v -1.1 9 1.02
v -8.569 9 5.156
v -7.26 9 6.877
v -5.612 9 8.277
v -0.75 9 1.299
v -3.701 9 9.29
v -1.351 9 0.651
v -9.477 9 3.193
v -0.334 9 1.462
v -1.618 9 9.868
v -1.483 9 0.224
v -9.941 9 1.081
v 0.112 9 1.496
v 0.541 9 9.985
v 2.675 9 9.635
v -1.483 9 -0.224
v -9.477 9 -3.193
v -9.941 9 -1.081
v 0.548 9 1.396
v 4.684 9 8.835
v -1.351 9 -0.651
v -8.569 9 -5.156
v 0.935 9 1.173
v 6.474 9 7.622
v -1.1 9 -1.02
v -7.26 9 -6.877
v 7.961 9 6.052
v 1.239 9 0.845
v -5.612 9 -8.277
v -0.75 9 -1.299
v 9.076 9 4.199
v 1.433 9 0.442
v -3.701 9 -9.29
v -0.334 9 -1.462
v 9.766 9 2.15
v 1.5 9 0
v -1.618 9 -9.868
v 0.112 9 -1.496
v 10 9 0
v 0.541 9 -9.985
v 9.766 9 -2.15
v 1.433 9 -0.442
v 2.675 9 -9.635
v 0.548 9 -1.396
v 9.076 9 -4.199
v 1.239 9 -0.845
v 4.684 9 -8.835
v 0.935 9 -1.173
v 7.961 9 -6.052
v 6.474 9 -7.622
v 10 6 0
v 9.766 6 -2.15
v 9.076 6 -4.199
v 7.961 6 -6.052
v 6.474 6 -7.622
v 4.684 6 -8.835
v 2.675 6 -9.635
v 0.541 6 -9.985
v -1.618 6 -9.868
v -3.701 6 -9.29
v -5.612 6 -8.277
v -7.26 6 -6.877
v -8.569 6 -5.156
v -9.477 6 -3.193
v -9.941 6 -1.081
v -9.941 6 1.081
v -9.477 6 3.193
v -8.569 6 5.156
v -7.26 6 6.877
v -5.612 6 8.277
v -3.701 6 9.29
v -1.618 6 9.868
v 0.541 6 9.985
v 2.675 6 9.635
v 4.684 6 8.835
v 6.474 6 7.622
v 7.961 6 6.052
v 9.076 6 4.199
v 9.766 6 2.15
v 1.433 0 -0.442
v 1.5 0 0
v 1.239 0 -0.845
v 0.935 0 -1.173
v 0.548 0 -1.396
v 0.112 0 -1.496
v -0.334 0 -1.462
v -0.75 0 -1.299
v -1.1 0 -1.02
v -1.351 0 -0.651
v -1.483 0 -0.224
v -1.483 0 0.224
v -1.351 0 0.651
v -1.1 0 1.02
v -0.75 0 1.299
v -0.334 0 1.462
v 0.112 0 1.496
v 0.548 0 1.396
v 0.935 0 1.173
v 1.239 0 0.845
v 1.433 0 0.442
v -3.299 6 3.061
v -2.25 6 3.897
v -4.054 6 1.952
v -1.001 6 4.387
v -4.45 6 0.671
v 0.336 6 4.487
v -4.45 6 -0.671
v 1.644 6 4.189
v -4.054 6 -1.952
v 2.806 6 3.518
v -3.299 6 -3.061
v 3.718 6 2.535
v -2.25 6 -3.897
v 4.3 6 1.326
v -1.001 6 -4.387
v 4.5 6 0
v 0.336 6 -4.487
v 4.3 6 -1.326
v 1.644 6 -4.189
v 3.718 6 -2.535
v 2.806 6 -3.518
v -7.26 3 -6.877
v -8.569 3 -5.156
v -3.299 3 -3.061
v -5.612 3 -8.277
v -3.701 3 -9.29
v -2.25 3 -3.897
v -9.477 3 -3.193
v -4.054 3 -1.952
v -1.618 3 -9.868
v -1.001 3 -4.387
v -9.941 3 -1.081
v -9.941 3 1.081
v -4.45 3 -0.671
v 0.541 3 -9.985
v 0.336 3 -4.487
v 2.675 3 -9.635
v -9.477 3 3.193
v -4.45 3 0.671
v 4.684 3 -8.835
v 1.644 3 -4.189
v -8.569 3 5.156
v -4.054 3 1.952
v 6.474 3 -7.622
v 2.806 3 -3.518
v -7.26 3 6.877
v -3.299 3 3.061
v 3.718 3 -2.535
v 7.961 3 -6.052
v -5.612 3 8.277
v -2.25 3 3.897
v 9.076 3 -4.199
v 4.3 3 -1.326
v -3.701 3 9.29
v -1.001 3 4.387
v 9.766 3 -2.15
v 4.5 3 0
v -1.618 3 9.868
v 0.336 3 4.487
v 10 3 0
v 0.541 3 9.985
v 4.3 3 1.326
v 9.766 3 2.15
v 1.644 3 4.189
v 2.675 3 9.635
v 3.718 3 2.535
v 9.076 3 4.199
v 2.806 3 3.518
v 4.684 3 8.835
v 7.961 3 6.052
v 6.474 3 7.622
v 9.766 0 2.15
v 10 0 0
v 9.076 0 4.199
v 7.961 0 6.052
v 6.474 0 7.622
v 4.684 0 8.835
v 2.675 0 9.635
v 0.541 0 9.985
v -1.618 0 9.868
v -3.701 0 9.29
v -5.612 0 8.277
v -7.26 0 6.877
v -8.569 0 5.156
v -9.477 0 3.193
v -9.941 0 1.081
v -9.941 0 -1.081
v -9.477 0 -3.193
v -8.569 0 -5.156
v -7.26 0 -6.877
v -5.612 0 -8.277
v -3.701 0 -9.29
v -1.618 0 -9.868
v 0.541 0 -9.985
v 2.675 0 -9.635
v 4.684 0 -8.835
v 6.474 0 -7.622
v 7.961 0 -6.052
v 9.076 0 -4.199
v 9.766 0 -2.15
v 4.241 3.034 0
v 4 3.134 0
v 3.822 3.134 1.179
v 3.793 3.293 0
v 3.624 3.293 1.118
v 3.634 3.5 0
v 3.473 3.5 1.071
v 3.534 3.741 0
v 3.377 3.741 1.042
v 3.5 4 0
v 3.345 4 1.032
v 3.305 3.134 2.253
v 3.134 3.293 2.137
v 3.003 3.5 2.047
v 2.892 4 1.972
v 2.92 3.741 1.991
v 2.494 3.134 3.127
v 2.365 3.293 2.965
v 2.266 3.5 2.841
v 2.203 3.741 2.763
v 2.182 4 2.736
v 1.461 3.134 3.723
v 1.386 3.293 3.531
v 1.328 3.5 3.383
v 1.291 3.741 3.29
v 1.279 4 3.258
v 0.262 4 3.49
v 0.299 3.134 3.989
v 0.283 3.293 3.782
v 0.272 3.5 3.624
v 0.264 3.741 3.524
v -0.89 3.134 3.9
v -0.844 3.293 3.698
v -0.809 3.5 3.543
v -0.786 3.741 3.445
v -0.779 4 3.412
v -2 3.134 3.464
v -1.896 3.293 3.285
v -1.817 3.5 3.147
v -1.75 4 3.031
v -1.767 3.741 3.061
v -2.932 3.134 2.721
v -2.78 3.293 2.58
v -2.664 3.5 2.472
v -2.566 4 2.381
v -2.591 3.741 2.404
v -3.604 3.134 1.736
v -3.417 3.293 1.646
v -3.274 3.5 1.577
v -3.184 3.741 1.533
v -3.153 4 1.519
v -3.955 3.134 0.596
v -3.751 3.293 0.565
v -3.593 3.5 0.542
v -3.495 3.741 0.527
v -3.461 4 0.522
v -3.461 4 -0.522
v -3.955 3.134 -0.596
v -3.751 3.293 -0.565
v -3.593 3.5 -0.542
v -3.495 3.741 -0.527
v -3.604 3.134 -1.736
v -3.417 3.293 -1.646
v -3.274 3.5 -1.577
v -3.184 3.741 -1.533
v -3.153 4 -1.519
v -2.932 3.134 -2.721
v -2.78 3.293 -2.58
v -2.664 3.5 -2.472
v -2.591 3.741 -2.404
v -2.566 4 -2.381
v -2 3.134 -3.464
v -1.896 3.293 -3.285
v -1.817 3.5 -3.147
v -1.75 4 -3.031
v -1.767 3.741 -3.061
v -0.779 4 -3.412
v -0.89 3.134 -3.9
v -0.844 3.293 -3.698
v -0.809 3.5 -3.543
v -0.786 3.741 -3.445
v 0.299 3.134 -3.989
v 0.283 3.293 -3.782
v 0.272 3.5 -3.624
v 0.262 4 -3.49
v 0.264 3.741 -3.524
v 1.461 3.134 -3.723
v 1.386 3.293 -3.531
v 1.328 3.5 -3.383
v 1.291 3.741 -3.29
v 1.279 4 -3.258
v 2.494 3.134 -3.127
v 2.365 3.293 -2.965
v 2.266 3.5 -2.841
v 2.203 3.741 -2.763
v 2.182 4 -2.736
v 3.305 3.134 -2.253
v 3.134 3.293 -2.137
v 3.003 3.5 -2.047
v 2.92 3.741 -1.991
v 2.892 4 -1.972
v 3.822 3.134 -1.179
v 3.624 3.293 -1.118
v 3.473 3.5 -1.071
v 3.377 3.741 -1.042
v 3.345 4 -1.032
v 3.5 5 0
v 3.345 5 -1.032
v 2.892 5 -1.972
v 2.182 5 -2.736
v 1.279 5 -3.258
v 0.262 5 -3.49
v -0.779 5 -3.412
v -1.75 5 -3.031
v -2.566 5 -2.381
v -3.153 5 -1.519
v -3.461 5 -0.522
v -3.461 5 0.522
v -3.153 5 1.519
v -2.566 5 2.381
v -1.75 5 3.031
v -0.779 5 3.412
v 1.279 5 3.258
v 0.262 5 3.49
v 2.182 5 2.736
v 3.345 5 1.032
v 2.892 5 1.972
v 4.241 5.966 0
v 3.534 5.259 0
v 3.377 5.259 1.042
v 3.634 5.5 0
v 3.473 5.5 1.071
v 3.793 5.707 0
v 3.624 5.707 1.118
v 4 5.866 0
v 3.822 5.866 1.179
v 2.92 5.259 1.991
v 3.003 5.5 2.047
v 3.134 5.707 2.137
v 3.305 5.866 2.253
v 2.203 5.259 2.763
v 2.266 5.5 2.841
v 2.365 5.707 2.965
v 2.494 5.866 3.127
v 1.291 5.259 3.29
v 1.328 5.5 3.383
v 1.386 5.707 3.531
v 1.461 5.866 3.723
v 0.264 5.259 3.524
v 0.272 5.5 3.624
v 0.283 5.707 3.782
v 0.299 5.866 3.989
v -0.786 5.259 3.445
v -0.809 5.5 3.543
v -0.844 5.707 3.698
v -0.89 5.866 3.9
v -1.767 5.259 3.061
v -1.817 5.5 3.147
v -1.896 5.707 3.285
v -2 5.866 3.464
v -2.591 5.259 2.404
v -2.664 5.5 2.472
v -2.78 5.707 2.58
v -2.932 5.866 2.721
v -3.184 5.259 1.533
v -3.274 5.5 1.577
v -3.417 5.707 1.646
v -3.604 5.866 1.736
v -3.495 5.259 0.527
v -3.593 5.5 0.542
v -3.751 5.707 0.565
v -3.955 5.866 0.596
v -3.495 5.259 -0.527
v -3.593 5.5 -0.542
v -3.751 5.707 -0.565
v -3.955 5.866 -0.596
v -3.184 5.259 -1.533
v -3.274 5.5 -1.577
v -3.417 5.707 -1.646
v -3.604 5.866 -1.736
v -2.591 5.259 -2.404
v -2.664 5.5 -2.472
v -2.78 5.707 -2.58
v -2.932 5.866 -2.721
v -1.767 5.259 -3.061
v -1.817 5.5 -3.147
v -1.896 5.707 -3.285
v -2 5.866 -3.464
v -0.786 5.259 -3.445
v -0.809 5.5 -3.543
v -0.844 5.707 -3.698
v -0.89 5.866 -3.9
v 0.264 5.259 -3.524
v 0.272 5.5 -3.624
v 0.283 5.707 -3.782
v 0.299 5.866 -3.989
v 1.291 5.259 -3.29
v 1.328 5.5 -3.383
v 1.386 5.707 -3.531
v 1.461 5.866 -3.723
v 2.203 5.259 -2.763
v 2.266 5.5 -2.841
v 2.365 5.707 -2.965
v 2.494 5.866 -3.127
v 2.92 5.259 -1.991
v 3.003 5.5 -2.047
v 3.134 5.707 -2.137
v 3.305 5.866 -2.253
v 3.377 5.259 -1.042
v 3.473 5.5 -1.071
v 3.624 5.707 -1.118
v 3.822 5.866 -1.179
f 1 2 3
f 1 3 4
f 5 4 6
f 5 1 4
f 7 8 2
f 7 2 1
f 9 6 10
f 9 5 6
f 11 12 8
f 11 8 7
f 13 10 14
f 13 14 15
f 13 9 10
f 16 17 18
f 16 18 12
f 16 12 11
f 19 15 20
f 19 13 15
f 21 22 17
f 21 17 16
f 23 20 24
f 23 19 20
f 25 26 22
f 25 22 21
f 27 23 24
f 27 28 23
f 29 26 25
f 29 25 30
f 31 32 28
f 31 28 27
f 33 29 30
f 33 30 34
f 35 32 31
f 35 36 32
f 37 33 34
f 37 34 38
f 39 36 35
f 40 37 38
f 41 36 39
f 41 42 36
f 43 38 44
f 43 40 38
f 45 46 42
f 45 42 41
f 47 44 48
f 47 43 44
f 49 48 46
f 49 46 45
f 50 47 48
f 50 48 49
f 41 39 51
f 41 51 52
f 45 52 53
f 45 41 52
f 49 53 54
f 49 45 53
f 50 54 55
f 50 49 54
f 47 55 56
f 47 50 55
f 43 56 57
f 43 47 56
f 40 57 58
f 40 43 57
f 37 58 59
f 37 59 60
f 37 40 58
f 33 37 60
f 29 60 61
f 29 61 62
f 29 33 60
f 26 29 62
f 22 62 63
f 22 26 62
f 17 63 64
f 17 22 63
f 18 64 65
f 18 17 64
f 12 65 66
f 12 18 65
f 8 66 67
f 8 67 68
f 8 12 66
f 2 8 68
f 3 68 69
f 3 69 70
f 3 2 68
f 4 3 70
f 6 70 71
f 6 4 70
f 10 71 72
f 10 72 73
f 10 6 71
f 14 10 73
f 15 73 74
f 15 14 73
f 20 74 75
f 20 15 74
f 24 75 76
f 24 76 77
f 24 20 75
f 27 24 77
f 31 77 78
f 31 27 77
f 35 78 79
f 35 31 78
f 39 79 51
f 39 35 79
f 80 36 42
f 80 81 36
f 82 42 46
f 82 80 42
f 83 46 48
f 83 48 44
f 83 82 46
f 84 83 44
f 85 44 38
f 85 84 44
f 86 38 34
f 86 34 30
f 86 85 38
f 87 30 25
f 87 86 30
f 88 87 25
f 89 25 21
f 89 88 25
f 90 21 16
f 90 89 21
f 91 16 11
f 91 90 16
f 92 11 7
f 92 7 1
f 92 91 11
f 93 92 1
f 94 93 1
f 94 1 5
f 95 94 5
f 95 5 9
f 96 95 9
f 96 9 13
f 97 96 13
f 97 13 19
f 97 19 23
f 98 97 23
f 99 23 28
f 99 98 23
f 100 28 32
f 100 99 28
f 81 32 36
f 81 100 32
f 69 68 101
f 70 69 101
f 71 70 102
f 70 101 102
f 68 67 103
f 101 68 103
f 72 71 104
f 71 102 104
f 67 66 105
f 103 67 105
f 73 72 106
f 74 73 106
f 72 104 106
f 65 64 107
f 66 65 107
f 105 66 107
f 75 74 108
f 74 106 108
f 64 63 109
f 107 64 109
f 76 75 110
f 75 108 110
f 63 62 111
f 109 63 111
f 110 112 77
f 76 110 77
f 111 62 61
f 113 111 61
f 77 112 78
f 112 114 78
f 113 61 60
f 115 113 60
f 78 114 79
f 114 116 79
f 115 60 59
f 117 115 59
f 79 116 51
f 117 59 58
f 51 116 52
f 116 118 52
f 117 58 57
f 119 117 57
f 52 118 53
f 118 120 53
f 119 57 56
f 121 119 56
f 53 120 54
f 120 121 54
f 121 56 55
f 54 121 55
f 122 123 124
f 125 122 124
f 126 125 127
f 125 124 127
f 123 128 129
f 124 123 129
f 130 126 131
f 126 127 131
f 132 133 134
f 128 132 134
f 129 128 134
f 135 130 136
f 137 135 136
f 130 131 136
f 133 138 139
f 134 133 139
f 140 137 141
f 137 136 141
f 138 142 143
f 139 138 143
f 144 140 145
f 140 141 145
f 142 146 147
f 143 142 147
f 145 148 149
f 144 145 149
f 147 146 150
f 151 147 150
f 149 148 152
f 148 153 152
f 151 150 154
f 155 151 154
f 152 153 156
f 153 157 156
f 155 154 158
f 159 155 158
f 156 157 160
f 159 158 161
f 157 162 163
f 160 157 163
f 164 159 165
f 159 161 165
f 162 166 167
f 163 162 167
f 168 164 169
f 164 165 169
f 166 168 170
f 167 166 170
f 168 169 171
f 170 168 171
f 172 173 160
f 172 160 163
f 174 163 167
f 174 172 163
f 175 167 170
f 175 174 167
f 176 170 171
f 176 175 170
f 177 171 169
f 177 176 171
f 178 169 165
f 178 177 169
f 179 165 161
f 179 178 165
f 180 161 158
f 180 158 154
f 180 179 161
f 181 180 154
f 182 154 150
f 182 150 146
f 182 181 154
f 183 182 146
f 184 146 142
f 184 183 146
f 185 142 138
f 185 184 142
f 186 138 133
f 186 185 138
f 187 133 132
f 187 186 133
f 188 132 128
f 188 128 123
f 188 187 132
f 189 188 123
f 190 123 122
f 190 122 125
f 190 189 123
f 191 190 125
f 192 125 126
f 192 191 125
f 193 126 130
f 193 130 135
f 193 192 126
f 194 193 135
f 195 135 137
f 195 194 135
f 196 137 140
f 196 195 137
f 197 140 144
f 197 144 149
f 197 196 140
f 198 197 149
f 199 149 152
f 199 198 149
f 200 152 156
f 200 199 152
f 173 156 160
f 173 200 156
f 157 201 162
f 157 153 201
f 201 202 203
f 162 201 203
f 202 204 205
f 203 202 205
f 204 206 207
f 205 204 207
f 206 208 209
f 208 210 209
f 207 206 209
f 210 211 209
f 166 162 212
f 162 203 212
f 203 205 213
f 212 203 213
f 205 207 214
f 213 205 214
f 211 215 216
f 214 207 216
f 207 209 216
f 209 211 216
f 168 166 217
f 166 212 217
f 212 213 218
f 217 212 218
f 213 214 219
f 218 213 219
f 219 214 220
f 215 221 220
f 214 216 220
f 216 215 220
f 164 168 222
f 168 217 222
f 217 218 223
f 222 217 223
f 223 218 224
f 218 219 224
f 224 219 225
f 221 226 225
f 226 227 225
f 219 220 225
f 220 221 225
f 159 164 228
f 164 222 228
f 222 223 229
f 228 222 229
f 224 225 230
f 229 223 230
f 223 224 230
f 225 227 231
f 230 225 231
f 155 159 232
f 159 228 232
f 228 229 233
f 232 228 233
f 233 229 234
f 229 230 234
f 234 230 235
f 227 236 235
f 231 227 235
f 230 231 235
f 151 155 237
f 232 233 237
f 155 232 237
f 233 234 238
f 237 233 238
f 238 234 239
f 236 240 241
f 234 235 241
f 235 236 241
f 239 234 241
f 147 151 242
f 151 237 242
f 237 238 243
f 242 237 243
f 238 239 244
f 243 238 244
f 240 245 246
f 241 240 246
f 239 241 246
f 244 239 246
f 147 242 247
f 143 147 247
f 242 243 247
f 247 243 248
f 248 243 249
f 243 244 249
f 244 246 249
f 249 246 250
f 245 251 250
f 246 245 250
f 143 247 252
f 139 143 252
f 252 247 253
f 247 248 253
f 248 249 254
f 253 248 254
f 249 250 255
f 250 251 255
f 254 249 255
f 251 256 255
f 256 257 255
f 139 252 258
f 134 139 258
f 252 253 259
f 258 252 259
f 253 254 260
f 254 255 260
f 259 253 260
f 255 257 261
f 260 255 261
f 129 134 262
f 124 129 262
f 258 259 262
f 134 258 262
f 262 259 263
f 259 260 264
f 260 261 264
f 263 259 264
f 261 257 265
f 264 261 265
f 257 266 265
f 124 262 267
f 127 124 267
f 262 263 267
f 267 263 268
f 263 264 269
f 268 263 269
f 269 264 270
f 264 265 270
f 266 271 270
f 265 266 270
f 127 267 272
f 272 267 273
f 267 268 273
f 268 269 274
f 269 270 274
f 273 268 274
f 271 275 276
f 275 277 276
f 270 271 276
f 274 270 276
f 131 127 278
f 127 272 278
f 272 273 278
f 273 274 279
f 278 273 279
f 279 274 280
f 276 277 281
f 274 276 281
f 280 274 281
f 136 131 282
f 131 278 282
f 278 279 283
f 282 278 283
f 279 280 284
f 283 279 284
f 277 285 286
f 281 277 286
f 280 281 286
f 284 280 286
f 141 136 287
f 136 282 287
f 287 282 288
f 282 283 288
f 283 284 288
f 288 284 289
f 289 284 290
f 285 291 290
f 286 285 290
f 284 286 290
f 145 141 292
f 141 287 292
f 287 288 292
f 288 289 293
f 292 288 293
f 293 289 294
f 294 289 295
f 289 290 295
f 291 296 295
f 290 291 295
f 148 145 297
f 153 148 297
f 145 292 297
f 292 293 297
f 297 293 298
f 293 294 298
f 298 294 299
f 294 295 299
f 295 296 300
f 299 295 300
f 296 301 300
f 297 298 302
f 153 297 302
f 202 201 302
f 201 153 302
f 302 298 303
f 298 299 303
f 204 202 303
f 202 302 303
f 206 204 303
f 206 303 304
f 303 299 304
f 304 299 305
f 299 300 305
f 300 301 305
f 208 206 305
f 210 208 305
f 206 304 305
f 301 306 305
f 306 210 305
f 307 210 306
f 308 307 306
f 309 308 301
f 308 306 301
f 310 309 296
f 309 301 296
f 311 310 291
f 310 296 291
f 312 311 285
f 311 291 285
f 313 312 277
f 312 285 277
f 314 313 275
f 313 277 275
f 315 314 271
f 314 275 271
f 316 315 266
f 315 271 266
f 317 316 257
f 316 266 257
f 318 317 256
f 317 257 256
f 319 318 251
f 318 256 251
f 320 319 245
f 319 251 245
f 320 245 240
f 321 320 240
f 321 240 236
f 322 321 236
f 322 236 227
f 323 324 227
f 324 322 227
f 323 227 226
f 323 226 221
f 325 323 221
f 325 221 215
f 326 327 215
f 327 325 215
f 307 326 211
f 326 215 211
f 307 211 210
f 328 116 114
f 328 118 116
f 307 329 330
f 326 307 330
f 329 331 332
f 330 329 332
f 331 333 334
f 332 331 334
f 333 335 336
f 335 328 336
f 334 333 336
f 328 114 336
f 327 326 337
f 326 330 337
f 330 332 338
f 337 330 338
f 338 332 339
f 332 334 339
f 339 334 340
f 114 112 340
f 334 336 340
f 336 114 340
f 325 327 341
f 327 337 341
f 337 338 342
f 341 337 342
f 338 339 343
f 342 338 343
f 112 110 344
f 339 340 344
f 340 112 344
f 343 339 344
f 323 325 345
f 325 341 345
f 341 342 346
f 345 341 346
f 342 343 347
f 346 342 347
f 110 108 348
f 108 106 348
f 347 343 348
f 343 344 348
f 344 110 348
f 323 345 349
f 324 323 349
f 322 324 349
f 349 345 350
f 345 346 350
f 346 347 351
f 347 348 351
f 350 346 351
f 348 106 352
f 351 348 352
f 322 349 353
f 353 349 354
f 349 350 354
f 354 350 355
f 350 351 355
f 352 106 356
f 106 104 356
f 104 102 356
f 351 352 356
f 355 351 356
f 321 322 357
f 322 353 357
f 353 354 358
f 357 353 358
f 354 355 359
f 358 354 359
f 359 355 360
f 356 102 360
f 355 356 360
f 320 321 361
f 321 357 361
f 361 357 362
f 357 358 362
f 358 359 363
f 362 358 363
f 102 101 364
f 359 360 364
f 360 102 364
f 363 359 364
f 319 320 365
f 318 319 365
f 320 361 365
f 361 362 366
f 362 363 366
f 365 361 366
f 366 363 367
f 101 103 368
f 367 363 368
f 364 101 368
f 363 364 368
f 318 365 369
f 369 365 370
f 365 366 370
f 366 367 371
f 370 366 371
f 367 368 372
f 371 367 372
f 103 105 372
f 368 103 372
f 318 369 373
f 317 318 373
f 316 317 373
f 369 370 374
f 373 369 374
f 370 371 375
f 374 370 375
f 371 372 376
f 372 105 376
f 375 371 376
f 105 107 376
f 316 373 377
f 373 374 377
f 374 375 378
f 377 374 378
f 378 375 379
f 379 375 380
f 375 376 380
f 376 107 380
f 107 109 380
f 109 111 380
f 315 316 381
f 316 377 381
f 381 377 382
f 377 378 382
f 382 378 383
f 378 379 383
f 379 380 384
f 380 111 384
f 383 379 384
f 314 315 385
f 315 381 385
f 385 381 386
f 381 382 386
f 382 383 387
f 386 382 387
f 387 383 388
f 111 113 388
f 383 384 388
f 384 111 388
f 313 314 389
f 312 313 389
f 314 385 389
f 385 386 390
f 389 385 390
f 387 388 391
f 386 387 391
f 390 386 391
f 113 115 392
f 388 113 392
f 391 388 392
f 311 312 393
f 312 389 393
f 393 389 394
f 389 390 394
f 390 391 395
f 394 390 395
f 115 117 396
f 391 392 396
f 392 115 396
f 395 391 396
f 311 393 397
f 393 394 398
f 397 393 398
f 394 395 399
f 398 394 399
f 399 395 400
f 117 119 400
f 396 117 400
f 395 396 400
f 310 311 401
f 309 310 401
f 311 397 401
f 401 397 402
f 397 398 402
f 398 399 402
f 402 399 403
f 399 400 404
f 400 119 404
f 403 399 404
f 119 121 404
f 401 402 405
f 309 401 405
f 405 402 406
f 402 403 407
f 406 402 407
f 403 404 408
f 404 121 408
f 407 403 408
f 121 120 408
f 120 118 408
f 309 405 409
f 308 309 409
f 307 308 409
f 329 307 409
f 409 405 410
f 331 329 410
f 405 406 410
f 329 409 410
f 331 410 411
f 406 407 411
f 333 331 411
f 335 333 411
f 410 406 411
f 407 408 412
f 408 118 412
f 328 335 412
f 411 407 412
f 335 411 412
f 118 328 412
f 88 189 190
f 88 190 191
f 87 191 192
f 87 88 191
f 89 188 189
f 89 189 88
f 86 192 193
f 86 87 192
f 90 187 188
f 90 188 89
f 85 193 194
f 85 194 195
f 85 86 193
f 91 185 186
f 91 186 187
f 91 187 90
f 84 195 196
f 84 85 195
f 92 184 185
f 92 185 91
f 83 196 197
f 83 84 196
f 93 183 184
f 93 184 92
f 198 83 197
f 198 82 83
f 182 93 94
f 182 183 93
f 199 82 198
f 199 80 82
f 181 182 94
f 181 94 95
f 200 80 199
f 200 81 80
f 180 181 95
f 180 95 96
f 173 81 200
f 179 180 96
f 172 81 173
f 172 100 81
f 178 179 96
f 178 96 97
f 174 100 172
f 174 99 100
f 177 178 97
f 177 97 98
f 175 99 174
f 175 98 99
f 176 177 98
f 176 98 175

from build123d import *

# Parameters (mm, degrees)
SKETCH1_R           = 3.5
SKETCH1_R_2         = 1.5
BOSS_EXTRUDE1_DEPTH = 9
SKETCH2_R           = 6
SKETCH2_R_2         = 1.5
BOSS_EXTRUDE2_DEPTH = 3
SKETCH3_R           = 5
SKETCH3_R_2         = 1.5
BOSS_EXTRUDE3_DEPTH = 3
FILLET2_R           = 1
SKETCH4_R           = 10
SKETCH4_R_2         = 1.5
BOSS_EXTRUDE4_DEPTH = 3
SKETCH5_R           = 10
SKETCH5_R_2         = 1.5
BOSS_EXTRUDE5_DEPTH = 3


with BuildPart() as part:
    # Sketch1 → Boss-Extrude1 (new body)
    with BuildSketch(Plane(origin=(0, 0, 0), x_dir=(1, 0, 0), z_dir=(0, 1, 0))):
        Circle(SKETCH1_R)
        Circle(SKETCH1_R_2, mode=Mode.SUBTRACT)
    extrude(amount=BOSS_EXTRUDE1_DEPTH)

    # Sketch2 → Boss-Extrude2 (add)
    with BuildSketch(Plane(origin=(0, 9, 0), x_dir=(1, 0, 0), z_dir=(0, 1, 0))):
        Circle(SKETCH2_R)
        Circle(SKETCH2_R_2, mode=Mode.SUBTRACT)
    extrude(amount=-BOSS_EXTRUDE2_DEPTH)

    # Sketch3 → Boss-Extrude3 (add)
    with BuildSketch(Plane.XZ):
        Circle(SKETCH3_R)
        Circle(SKETCH3_R_2, mode=Mode.SUBTRACT)
    extrude(amount=-BOSS_EXTRUDE3_DEPTH)

    # Fillet2
    fillet2_edges = [part.edges().sort_by_distance(p)[0] for p in [
        (-3.5, 6, 0),
        (-3.5, 3, 0),
    ]]
    fillet(fillet2_edges, radius=FILLET2_R)

    # Sketch4 → Boss-Extrude4 (add)
    with BuildSketch(Plane.XZ):
        Circle(SKETCH4_R)
        Circle(SKETCH4_R_2, mode=Mode.SUBTRACT)
    extrude(amount=-BOSS_EXTRUDE4_DEPTH)

    # Sketch5 → Boss-Extrude5 (add)
    with BuildSketch(Plane(origin=(0, 9, 0), x_dir=(1, 0, 0), z_dir=(0, 1, 0))):
        Circle(SKETCH5_R)
        Circle(SKETCH5_R_2, mode=Mode.SUBTRACT)
    extrude(amount=-BOSS_EXTRUDE5_DEPTH)


solid = part.part
